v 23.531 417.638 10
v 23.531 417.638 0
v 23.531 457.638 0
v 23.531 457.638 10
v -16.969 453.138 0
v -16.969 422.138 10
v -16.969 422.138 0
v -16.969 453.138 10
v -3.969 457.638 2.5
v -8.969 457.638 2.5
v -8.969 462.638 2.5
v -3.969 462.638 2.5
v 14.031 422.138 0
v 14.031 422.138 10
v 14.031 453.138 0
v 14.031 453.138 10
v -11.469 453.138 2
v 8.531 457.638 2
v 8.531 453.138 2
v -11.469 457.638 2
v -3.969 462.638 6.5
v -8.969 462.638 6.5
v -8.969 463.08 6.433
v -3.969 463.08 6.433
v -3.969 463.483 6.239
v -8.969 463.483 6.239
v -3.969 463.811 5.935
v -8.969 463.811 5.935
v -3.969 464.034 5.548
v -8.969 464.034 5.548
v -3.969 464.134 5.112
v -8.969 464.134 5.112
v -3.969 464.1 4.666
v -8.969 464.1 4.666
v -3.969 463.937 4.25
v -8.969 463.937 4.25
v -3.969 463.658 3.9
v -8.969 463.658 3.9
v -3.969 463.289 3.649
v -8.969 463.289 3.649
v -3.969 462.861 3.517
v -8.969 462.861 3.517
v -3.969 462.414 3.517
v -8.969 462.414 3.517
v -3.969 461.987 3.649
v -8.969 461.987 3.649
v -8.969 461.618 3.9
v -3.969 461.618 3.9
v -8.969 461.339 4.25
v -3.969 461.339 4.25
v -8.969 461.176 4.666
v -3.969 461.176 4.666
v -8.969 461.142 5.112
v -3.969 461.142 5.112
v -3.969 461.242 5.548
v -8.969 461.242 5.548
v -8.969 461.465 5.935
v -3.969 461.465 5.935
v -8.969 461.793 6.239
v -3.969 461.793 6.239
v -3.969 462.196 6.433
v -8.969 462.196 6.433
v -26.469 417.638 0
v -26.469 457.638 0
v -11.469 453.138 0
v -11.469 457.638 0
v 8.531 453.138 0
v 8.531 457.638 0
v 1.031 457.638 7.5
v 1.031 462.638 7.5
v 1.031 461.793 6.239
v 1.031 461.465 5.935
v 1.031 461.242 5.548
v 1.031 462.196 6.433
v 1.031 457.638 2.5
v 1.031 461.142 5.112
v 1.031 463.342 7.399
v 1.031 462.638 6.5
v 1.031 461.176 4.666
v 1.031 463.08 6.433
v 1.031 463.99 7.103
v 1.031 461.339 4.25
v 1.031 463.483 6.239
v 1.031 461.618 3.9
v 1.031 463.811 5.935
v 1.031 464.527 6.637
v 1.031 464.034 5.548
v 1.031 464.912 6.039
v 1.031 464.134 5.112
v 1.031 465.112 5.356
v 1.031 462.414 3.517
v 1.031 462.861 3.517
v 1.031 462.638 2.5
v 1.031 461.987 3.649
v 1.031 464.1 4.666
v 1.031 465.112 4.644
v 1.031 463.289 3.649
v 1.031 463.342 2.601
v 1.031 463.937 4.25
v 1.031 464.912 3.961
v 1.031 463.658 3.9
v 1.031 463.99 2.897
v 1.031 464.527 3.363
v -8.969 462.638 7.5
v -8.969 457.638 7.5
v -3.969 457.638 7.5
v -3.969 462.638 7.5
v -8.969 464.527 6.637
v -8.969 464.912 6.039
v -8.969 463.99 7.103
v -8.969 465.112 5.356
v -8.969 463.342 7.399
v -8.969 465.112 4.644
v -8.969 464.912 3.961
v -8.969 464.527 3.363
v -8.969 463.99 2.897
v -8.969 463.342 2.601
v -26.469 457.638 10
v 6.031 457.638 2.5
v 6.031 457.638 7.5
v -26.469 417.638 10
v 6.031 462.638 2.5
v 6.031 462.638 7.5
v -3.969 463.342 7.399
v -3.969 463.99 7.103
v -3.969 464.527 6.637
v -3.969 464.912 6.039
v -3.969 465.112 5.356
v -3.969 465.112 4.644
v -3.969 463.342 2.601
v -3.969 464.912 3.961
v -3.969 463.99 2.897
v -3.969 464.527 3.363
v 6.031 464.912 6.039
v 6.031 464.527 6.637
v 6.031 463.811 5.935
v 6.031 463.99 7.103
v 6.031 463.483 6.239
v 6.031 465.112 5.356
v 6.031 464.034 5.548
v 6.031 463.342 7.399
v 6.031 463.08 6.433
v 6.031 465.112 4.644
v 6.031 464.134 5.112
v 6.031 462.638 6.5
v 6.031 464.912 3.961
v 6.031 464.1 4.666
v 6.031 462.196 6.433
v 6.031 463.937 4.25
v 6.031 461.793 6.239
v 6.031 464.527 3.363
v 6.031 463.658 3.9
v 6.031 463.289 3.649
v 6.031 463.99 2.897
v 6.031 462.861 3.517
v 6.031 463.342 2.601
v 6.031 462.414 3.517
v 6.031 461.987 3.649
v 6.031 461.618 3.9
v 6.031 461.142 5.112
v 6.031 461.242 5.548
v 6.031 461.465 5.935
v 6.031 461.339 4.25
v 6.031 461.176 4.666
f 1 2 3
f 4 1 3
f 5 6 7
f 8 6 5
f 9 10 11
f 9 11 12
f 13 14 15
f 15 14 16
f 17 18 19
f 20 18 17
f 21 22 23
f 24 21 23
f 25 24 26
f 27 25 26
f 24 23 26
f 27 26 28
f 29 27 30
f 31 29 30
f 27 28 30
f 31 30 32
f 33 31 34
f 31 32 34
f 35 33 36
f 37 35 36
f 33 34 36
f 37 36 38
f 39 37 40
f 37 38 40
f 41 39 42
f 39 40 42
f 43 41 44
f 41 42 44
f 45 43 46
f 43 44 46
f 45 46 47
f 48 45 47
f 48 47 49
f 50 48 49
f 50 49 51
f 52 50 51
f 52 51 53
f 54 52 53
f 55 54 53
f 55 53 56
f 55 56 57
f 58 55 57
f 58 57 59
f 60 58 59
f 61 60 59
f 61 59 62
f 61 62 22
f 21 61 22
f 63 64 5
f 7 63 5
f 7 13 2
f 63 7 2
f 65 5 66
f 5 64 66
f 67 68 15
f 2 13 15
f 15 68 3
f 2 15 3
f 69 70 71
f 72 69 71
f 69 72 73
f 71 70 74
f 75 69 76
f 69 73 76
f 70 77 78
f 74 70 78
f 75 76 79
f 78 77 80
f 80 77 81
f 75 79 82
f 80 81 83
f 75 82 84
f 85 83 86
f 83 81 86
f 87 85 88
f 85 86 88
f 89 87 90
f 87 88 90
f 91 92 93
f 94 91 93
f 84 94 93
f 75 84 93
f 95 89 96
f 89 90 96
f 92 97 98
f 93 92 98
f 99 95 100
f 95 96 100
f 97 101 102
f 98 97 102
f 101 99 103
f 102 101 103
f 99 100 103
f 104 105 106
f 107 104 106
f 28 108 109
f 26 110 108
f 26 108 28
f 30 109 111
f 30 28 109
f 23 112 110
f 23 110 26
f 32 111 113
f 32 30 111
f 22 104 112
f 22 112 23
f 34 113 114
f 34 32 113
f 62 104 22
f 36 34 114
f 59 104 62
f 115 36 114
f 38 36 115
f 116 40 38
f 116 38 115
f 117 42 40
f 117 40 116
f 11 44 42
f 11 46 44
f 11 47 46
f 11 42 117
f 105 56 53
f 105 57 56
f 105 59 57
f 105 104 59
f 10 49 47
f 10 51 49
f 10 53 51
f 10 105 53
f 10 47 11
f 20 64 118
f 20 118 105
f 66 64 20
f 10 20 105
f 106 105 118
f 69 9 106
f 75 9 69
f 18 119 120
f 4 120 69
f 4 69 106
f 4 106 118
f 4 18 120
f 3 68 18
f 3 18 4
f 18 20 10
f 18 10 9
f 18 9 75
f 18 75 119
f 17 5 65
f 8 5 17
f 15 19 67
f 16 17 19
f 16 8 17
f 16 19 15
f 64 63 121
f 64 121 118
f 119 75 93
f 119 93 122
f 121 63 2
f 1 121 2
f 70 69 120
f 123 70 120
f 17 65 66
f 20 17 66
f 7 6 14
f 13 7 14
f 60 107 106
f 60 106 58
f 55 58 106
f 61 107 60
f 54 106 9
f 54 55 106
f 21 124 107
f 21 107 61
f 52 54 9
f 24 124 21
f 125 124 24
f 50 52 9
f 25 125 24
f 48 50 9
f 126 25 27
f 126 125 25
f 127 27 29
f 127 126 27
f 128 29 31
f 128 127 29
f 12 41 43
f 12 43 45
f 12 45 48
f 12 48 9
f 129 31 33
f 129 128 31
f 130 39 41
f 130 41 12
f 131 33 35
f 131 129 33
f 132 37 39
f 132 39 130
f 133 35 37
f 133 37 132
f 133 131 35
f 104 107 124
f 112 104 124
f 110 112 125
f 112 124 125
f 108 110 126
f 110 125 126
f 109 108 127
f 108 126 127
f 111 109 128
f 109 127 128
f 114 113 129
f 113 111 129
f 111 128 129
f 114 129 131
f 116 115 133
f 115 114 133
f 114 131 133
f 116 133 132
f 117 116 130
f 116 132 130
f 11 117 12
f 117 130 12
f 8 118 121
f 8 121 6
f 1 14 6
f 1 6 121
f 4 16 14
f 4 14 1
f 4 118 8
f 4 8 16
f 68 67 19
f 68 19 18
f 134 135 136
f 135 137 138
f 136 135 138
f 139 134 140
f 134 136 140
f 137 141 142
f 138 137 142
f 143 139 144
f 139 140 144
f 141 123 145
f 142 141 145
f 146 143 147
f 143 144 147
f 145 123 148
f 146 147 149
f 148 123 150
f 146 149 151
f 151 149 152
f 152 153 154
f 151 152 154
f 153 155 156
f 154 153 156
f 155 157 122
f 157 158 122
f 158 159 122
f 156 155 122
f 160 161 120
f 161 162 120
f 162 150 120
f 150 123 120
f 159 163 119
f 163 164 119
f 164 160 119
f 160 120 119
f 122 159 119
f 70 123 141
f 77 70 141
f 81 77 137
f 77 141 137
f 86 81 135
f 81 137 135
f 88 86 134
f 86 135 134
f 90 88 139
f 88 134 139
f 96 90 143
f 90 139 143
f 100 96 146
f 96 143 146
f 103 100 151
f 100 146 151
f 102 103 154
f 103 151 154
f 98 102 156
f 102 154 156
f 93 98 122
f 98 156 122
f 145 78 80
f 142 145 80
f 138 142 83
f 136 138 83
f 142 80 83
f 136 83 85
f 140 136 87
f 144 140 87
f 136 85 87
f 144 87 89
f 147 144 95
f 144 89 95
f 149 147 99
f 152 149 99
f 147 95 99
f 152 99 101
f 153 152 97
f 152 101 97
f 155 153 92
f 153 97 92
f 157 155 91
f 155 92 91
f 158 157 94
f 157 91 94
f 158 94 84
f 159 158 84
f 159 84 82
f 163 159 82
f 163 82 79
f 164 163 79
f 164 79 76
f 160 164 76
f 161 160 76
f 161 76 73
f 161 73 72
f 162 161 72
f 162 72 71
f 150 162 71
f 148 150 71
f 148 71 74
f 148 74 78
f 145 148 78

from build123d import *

# Parameters (mm, degrees)
SKETCH1_W           = 50
SKETCH1_H           = 40
BOSS_EXTRUDE1_DEPTH = 10
SKETCH5_W           = 6
SKETCH5_H           = 5
BOSS_EXTRUDE3_DEPTH = 10
SKETCH6_R           = 2
CUT_EXTRUDE1_DEPTH  = 20
SKETCH8_W           = 10
SKETCH8_H           = 40
CUT_EXTRUDE2_DEPTH  = 25
SKETCH9_W           = 10
SKETCH9_H           = 6
SKETCH9_R           = 1.930897171
BOSS_EXTRUDE4_DEPTH = 5
SKETCH10_W          = 10
SKETCH10_H          = 5
CUT_EXTRUDE3_DEPTH  = 15
SKETCH11_W          = 5
SKETCH11_H          = 5
BOSS_EXTRUDE5_DEPTH = 10
SKETCH12_R          = 1.5
CUT_EXTRUDE4_DEPTH  = 10
SKETCH13_W          = 6
SKETCH13_H          = 5
CUT_EXTRUDE5_DEPTH  = 10
SKETCH15_W          = 5
SKETCH15_H          = 5
BOSS_EXTRUDE7_DEPTH = 10
SKETCH18_W          = 5
SKETCH18_H          = 5
CUT_EXTRUDE7_DEPTH  = 10
SKETCH19_R          = 1.5
CUT_EXTRUDE8_DEPTH  = 43
CUT_EXTRUDE9_DEPTH  = 20
SKETCH21_W          = 31
SKETCH21_H          = 31
CUT_EXTRUDE10_DEPTH = 30
SKETCH22_W          = 20
SKETCH22_H          = 4.999197144
CUT_EXTRUDE11_DEPTH = 2


with BuildPart() as part:
    # Sketch1 → Boss-Extrude1 (new body)
    with BuildSketch(Plane(origin=(669.84184187, 0, 0), x_dir=(1, 0, 0), z_dir=(0, 0, 1))):
        with Locations((-671.310344828, 437.637931034)):
            Rectangle(SKETCH1_W, SKETCH1_H)
    boss_extrude1 = extrude(amount=BOSS_EXTRUDE1_DEPTH)

    # Sketch5 → Boss-Extrude3 (add)
    with BuildSketch(Plane(origin=(23.531497042, 0, 0), x_dir=(0, 0, -1), z_dir=(1, 0, 0))):
        with Locations((-5, 442.637931034)):
            Rectangle(SKETCH5_W, SKETCH5_H)
        with Locations((-5, 432.637931034)):
            Rectangle(SKETCH5_W, SKETCH5_H)
    extrude(amount=BOSS_EXTRUDE3_DEPTH)

    # Sketch6 → Cut-Extrude1 (cut)
    with BuildSketch(Plane(origin=(669.84184187, 445.137931034, 0), x_dir=(1, 0, 0), z_dir=(0, 1, 0))):
        with Locations(Location((-641.310344828, -5, 0), (0, 0, 180))):
            Circle(SKETCH6_R)
    extrude(amount=-CUT_EXTRUDE1_DEPTH, mode=Mode.SUBTRACT)

    # Sketch8 → Cut-Extrude2 (cut)
    with BuildSketch(Plane.ZY.offset(26.468502958)):
        with Locations((5, 437.637931034)):
            Rectangle(SKETCH8_W, SKETCH8_H)
    extrude(amount=-CUT_EXTRUDE2_DEPTH, mode=Mode.SUBTRACT)

    # Sketch9 → Boss-Extrude4 (add)
    with BuildSketch(Plane(origin=(0, 435.137931034, 0), x_dir=(1, 0, 0), z_dir=(0, 1, 0))):
        with Locations((28.531497042, -5)):
            Rectangle(SKETCH9_W, SKETCH9_H)
        with Locations(Location((28.531497042, -5, 0), (0, 0, 180))):
            Circle(SKETCH9_R, mode=Mode.SUBTRACT)
    extrude(amount=BOSS_EXTRUDE4_DEPTH)

    # Sketch10 → Cut-Extrude3 (cut)
    with BuildSketch(Plane.XY.offset(8)):
        with Locations((28.531497042, 432.637931034)):
            Rectangle(SKETCH10_W, SKETCH10_H)
        with Locations((28.531497042, 442.637931034)):
            Rectangle(SKETCH10_W, SKETCH10_H)
    extrude(amount=-CUT_EXTRUDE3_DEPTH, mode=Mode.SUBTRACT)

    # Mirror1: Boss-Extrude1 across plane
    add(boss_extrude1.mirror(Plane(origin=(-1.468502958, 0, 0), x_dir=(0, 0, 1), z_dir=(1, 0, 0))))

    # Sketch11 → Boss-Extrude5 (add)
    with BuildSketch(Plane(origin=(0, 457.637931034, 0), x_dir=(1, 0, 0), z_dir=(0, 1, 0))):
        with Locations((-1.468502958, -5)):
            Rectangle(SKETCH11_W, SKETCH11_H)
    extrude(amount=BOSS_EXTRUDE5_DEPTH)

    # Sketch12 → Cut-Extrude4 (cut)
    with BuildSketch(Plane(origin=(1.031497042, 0, 0), x_dir=(0, 0, -1), z_dir=(1, 0, 0))):
        with Locations((-5, 462.637931034)):
            Circle(SKETCH12_R)
    extrude(amount=-CUT_EXTRUDE4_DEPTH, mode=Mode.SUBTRACT)

    # Sketch13 → Cut-Extrude5 (cut)
    with BuildSketch(Plane(origin=(33.531497042, 0, 0), x_dir=(0, 0, -1), z_dir=(1, 0, 0))):
        with Locations((-5, 437.637931034)):
            Rectangle(SKETCH13_W, SKETCH13_H)
    extrude(amount=-CUT_EXTRUDE5_DEPTH, mode=Mode.SUBTRACT)

    # Sketch15 → Boss-Extrude7 (add)
    with BuildSketch(Plane(origin=(0, 457.637931034, 0), x_dir=(1, 0, 0), z_dir=(0, 1, 0))):
        with Locations((-6.468502958, -5)):
            Rectangle(SKETCH15_W, SKETCH15_H)
        with Locations((3.531497042, -5)):
            Rectangle(SKETCH15_W, SKETCH15_H)
    extrude(amount=BOSS_EXTRUDE7_DEPTH)

    # Sketch18 → Cut-Extrude7 (cut)
    with BuildSketch(Plane(origin=(0, 467.637931034, 0), x_dir=(1, 0, 0), z_dir=(0, 1, 0))):
        with Locations((-1.468502958, -5)):
            Rectangle(SKETCH18_W, SKETCH18_H)
    extrude(amount=-CUT_EXTRUDE7_DEPTH, mode=Mode.SUBTRACT)

    # Sketch19 → Cut-Extrude8 (cut)
    with BuildSketch(Plane.ZY.offset(8.968502958)):
        with Locations((5, 462.637931034)):
            Circle(SKETCH19_R)
    extrude(amount=-CUT_EXTRUDE8_DEPTH, mode=Mode.SUBTRACT)

    # Sketch20 → Cut-Extrude9 (cut)
    with BuildSketch(Plane(origin=(6.031497042, 0, 0), x_dir=(0, 0, -1), z_dir=(1, 0, 0))):
        with BuildLine():
            Line((-7.5, 467.637931034), (-7.5, 462.637931034))
            ThreePointArc((-7.5, 462.637931034), (-5, 465.137931034), (-2.5, 462.637931034))
            Line((-2.5, 462.637931034), (-2.5, 467.637931034))
            Line((-2.5, 467.637931034), (-7.5, 467.637931034))
        make_face()
    extrude(amount=-CUT_EXTRUDE9_DEPTH, mode=Mode.SUBTRACT)

    # Sketch21 → Cut-Extrude10 (cut)
    with BuildSketch(Plane.XY.offset(10)):
        with Locations((-1.468502958, 437.637931034)):
            Rectangle(SKETCH21_W, SKETCH21_H)
    extrude(amount=-CUT_EXTRUDE10_DEPTH, mode=Mode.SUBTRACT)

    # Sketch22 → Cut-Extrude11 (cut)
    with BuildSketch(Plane(origin=(0, 0, 0), x_dir=(-1, 0, 0), z_dir=(0, 0, -1))):
        with Locations((1.468502958, 455.138332462)):
            Rectangle(SKETCH22_W, SKETCH22_H)
    extrude(amount=-CUT_EXTRUDE11_DEPTH, mode=Mode.SUBTRACT)


solid = part.part
